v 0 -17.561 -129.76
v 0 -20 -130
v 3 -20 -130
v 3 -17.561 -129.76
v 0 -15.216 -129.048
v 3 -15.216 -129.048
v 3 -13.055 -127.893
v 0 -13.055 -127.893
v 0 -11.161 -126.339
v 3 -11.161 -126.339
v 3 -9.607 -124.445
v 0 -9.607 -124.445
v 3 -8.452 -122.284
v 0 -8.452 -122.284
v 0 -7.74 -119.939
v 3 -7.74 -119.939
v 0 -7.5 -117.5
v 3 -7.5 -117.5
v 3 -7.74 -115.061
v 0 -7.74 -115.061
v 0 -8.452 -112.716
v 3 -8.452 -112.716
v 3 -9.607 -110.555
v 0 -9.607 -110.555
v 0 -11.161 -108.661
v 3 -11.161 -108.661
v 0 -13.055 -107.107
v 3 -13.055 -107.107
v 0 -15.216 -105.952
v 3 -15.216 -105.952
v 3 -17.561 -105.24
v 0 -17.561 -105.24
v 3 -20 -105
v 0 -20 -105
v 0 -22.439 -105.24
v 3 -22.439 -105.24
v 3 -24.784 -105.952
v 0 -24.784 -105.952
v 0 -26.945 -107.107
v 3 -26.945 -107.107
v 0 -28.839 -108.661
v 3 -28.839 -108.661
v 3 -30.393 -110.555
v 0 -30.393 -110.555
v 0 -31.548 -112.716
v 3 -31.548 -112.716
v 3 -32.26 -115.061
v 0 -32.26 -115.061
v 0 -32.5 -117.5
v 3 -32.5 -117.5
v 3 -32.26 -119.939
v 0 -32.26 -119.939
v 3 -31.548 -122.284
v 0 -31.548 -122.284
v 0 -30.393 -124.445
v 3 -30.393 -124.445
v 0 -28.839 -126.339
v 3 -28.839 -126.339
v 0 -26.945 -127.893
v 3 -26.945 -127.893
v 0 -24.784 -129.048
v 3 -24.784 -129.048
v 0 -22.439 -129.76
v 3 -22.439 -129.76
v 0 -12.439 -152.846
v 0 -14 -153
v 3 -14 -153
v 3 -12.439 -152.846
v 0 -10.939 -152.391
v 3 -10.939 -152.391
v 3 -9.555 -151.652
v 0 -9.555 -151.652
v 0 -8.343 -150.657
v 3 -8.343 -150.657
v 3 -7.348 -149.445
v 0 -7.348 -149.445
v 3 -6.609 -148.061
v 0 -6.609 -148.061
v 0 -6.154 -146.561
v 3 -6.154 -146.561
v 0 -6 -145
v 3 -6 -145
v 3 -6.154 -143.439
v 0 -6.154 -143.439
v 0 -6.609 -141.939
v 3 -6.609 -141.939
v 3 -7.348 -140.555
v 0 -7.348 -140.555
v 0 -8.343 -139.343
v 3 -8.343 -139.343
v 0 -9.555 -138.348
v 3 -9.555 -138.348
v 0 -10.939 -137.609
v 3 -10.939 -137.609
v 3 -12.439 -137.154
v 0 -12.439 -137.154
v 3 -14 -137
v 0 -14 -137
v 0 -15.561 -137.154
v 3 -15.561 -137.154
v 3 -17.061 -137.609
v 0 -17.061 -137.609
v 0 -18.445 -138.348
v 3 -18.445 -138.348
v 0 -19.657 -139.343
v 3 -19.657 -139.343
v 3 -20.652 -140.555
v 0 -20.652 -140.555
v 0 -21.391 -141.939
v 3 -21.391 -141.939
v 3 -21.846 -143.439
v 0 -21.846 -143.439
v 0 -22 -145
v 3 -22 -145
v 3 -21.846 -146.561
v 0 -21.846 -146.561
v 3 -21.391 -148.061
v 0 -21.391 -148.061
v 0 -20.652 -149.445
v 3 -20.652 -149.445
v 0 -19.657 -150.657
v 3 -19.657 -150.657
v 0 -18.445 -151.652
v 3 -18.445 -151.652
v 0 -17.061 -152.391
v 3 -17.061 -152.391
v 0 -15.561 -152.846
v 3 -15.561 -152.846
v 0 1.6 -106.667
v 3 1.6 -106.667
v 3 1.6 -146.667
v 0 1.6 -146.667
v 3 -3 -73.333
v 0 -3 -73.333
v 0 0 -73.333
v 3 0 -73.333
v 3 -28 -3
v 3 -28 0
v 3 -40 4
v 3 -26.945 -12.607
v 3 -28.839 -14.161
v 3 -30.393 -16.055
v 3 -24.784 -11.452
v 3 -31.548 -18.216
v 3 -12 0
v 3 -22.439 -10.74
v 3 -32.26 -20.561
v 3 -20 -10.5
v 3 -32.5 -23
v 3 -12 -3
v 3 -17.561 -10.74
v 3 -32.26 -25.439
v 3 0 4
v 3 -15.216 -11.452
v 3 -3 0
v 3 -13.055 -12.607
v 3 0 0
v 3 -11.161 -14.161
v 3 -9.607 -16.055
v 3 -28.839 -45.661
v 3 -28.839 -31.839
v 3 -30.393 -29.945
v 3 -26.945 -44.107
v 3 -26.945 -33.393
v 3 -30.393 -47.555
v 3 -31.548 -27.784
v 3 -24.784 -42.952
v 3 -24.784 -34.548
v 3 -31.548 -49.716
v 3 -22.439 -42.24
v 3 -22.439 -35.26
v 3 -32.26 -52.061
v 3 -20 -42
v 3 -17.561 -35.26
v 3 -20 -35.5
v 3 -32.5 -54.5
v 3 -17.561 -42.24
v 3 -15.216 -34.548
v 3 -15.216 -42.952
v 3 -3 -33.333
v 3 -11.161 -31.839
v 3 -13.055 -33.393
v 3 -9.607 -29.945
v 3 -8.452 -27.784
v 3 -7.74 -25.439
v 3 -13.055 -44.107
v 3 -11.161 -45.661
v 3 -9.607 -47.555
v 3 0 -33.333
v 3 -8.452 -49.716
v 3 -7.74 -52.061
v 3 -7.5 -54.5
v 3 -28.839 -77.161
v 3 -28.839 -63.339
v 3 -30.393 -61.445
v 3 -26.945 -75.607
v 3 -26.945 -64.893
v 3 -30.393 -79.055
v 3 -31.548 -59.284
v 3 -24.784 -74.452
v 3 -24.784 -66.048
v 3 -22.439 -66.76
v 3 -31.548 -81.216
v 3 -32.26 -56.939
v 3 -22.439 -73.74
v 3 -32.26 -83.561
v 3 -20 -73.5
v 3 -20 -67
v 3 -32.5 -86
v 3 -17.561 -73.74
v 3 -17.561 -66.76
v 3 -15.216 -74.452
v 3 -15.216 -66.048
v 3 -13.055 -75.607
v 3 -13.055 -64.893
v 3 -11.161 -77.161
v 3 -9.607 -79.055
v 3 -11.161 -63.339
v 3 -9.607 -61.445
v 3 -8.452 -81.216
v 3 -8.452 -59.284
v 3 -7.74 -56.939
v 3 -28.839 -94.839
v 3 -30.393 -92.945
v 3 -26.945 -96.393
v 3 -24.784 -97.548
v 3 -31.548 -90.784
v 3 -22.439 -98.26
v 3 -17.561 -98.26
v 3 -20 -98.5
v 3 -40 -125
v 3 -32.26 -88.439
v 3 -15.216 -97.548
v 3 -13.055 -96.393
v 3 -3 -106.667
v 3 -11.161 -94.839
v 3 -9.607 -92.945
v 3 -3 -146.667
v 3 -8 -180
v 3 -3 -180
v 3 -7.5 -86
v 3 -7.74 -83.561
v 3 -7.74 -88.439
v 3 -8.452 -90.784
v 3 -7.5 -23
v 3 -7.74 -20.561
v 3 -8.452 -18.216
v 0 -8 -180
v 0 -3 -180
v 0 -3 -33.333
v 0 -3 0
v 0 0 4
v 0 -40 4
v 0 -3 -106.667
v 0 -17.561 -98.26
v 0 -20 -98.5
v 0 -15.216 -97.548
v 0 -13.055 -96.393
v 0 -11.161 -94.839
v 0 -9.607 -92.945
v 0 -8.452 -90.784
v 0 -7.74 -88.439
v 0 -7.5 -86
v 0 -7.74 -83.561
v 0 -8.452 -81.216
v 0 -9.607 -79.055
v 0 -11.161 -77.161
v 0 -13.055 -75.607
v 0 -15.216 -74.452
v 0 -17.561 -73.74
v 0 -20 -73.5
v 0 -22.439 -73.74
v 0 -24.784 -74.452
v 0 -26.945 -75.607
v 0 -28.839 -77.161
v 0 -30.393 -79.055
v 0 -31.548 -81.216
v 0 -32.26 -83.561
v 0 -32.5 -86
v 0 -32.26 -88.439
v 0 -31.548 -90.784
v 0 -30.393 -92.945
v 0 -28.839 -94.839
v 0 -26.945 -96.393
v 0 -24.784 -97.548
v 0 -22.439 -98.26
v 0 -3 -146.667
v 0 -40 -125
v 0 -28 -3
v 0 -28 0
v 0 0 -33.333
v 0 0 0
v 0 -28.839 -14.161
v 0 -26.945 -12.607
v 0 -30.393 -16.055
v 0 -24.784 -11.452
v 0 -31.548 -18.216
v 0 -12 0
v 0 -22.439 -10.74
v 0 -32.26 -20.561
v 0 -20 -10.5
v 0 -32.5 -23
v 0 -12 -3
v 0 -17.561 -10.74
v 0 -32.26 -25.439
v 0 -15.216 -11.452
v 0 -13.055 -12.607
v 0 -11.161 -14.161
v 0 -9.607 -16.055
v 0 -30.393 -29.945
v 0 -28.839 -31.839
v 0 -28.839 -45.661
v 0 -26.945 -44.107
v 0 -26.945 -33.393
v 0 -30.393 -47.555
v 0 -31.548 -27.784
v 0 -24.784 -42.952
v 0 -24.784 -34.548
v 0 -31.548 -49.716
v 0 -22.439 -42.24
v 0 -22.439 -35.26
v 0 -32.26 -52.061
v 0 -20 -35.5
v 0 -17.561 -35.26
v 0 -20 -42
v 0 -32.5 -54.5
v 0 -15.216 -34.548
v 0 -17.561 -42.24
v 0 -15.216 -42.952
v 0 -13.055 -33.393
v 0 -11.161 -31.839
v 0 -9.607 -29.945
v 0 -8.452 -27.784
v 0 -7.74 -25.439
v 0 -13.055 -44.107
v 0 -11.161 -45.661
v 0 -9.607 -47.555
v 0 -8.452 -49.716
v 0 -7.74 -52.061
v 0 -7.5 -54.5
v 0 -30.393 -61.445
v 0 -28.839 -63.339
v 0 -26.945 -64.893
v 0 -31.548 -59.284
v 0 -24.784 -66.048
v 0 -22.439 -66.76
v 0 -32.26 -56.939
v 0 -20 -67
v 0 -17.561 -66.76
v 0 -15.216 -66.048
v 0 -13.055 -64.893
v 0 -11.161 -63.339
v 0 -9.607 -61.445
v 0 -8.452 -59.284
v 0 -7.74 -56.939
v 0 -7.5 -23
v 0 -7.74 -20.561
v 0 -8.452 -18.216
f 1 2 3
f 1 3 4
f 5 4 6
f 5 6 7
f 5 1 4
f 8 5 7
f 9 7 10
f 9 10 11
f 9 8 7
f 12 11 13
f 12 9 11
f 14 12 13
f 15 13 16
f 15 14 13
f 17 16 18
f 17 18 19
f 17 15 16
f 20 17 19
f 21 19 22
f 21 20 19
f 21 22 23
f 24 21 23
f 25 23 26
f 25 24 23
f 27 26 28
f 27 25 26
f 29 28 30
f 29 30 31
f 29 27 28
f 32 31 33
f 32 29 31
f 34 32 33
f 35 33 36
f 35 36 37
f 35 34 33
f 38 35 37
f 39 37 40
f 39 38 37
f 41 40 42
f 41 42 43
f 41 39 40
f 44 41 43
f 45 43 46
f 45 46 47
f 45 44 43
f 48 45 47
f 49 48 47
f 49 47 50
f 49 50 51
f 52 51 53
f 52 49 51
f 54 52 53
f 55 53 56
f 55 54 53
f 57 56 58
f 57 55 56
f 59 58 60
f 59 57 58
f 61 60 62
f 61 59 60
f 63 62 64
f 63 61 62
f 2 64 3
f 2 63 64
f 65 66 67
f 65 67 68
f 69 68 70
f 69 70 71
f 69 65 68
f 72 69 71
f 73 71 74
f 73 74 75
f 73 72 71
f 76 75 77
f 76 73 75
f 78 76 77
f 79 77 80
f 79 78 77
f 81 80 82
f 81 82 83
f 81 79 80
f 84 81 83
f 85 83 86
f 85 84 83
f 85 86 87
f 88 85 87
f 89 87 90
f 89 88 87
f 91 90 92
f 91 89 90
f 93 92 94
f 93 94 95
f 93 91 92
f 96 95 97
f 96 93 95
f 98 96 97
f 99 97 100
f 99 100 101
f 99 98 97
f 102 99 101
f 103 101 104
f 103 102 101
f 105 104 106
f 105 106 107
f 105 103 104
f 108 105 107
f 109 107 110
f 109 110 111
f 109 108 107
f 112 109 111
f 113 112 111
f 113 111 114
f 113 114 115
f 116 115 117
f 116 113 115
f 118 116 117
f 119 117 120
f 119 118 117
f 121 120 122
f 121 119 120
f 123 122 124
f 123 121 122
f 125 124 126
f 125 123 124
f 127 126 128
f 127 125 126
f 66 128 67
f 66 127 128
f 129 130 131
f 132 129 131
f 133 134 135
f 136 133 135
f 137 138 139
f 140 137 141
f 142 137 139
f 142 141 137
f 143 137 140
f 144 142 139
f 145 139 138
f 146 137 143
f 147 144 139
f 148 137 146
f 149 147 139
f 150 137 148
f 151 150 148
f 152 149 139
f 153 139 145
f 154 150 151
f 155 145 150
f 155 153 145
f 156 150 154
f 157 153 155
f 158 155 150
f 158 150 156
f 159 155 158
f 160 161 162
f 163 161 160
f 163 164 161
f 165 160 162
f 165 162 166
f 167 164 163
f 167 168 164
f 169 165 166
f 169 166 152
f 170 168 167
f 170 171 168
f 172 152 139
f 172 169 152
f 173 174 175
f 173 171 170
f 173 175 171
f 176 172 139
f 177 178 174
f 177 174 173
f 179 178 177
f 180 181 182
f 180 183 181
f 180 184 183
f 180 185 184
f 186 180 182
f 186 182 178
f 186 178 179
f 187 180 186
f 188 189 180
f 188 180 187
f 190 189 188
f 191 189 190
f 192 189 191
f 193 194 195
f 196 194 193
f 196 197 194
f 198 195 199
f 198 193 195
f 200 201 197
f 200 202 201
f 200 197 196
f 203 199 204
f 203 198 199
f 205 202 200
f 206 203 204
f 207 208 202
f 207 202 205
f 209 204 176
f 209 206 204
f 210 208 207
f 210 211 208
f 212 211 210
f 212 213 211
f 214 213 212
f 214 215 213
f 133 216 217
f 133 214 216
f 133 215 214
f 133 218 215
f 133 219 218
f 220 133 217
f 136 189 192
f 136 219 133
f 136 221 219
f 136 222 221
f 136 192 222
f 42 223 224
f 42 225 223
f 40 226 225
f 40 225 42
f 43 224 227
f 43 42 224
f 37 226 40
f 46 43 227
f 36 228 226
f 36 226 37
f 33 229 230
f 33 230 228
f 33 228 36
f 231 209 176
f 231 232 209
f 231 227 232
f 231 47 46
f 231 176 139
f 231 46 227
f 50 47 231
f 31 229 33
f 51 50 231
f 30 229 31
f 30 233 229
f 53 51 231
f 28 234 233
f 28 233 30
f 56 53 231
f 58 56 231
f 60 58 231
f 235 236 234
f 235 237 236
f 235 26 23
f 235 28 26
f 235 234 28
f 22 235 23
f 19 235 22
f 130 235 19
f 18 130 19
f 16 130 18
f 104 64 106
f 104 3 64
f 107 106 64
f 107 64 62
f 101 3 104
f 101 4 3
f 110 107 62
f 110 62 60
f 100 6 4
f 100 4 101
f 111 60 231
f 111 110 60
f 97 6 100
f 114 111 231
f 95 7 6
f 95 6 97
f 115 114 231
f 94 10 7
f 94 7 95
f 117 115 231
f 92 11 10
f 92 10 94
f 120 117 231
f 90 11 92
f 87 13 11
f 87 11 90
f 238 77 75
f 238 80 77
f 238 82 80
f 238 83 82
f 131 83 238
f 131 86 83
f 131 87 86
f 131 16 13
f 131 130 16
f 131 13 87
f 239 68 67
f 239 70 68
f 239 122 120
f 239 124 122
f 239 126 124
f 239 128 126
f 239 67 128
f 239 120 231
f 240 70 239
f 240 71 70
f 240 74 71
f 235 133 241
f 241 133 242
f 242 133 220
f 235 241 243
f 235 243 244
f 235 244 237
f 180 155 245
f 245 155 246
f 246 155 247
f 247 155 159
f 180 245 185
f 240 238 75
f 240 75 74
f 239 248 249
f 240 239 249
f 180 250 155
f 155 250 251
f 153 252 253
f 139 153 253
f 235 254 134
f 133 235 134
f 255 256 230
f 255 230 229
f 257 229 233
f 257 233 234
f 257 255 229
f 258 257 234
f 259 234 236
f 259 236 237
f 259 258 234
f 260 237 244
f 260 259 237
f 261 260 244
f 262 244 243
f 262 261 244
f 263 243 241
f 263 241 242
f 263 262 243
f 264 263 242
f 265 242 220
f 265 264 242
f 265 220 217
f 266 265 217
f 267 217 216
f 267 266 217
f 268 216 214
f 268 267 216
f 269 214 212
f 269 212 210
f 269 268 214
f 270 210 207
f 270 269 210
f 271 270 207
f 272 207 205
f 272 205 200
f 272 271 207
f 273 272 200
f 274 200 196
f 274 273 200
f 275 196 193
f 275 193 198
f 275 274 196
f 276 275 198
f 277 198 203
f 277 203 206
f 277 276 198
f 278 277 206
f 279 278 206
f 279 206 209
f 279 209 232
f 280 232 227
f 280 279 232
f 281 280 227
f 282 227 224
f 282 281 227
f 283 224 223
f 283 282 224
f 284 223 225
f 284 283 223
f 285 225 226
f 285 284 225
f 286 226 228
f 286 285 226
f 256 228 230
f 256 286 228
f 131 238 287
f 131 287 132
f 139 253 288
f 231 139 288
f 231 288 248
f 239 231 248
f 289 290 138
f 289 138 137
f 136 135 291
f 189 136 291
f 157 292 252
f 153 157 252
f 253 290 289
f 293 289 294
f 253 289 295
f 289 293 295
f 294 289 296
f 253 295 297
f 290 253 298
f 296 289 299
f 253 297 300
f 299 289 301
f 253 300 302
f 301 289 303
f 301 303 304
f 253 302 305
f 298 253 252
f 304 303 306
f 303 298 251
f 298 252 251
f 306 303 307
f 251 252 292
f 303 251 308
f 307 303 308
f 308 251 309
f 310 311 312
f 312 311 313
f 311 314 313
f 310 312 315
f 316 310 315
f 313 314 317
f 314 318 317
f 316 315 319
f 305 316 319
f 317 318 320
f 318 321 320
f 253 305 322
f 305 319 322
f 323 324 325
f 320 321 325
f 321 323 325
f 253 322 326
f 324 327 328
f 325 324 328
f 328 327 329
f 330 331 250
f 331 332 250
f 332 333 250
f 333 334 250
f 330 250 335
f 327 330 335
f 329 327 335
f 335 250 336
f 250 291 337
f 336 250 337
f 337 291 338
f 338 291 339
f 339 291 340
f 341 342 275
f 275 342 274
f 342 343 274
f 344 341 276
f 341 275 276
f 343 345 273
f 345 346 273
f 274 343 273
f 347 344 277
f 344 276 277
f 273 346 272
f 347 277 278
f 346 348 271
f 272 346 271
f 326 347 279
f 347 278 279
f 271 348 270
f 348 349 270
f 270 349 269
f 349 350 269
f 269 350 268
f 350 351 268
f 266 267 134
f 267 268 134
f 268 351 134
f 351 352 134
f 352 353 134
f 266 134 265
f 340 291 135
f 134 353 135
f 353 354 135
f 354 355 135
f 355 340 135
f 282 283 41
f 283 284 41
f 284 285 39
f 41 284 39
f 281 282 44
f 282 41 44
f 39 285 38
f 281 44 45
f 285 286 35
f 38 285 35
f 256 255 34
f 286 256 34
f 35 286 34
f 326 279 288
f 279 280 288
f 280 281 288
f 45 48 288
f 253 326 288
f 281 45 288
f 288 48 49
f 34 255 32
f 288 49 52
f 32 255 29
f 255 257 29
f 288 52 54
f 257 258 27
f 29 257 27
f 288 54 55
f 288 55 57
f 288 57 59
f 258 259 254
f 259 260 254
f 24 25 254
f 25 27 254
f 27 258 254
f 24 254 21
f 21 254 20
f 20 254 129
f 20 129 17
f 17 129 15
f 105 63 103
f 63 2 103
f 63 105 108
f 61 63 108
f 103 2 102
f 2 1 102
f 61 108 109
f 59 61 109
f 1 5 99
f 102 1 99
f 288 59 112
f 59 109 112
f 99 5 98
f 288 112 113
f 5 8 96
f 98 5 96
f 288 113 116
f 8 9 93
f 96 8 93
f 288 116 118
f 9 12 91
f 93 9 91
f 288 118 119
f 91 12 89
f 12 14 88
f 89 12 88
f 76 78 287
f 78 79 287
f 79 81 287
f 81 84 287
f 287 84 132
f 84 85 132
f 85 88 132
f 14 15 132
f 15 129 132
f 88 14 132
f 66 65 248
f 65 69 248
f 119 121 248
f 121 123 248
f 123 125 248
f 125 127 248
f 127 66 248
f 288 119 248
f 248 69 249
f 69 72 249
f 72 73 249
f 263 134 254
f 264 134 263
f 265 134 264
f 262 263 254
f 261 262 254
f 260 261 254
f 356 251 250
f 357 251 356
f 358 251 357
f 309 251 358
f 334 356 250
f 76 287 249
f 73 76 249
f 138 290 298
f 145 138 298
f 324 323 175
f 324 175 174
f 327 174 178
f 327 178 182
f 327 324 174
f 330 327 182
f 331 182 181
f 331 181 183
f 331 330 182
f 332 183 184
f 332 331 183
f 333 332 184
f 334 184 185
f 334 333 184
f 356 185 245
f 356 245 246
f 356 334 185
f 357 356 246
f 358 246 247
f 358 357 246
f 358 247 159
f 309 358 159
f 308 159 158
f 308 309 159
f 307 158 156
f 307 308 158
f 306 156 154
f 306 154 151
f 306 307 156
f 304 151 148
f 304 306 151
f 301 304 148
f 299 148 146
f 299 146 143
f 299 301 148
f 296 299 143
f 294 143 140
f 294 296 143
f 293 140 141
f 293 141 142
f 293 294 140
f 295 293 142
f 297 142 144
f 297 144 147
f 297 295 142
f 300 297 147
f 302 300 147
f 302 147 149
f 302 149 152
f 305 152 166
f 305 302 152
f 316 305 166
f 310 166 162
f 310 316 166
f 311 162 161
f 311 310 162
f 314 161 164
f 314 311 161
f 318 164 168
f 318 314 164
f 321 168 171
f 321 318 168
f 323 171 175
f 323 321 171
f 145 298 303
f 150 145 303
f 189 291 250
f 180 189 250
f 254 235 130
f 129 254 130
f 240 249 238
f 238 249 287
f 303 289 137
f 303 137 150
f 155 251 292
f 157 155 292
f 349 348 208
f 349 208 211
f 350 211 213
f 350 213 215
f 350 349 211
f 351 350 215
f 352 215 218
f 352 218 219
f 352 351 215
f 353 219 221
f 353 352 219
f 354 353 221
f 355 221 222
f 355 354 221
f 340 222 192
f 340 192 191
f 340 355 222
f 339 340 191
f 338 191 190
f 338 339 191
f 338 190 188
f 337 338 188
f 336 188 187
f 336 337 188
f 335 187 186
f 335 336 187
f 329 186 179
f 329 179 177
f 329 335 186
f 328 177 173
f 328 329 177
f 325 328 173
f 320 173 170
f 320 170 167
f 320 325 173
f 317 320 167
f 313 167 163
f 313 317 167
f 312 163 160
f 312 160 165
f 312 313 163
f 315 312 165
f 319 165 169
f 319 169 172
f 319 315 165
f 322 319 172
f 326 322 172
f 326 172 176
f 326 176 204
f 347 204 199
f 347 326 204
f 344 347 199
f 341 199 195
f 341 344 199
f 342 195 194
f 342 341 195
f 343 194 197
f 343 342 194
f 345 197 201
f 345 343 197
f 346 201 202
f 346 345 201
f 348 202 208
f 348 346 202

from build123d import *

# Parameters (mm, degrees)
SKETCH1_W           = 3
SKETCH1_H           = 16
SKETCH1_R           = 12.5
SKETCH1_R_2         = 8
BOSS_EXTRUDE1_DEPTH = 3
SKETCH2_W           = 40
SKETCH2_H           = 1.6
BOSS_EXTRUDE2_DEPTH = 3


with BuildPart() as part:
    # Sketch1 → Boss-Extrude1 (new body)
    with BuildSketch(Plane(origin=(0, 0, 0), x_dir=(0, 0, -1), z_dir=(1, 0, 0))):
        Polygon((125, -40), (180, -8), (180, -3), (146.666666667, -3), (146.666666667, 0), (106.666666667, 0), (106.666666667, -3), (73.333333333, -3), (73.333333333, 0), (33.333333333, 0), (33.333333333, -3), (0, -3), (0, 0), (-4, 0), (-4, -40), (0, -40), align=None)
        with Locations((1.5, -20)):
            Rectangle(SKETCH1_W, SKETCH1_H, mode=Mode.SUBTRACT)
        with Locations((23, -20)):
            Circle(SKETCH1_R, mode=Mode.SUBTRACT)
        with Locations((54.5, -20)):
            Circle(SKETCH1_R, mode=Mode.SUBTRACT)
        with Locations((86, -20)):
            Circle(SKETCH1_R, mode=Mode.SUBTRACT)
        with Locations((117.5, -20)):
            Circle(SKETCH1_R, mode=Mode.SUBTRACT)
        with Locations((145, -14)):
            Circle(SKETCH1_R_2, mode=Mode.SUBTRACT)
    extrude(amount=BOSS_EXTRUDE1_DEPTH)

    # Sketch2 → Boss-Extrude2 (add)
    with BuildSketch(Plane(origin=(3, 0, 0), x_dir=(0, 0, -1), z_dir=(1, 0, 0))):
        with Locations((126.666666667, 0.8)):
            Rectangle(SKETCH2_W, SKETCH2_H)
    extrude(amount=-BOSS_EXTRUDE2_DEPTH)


solid = part.part
